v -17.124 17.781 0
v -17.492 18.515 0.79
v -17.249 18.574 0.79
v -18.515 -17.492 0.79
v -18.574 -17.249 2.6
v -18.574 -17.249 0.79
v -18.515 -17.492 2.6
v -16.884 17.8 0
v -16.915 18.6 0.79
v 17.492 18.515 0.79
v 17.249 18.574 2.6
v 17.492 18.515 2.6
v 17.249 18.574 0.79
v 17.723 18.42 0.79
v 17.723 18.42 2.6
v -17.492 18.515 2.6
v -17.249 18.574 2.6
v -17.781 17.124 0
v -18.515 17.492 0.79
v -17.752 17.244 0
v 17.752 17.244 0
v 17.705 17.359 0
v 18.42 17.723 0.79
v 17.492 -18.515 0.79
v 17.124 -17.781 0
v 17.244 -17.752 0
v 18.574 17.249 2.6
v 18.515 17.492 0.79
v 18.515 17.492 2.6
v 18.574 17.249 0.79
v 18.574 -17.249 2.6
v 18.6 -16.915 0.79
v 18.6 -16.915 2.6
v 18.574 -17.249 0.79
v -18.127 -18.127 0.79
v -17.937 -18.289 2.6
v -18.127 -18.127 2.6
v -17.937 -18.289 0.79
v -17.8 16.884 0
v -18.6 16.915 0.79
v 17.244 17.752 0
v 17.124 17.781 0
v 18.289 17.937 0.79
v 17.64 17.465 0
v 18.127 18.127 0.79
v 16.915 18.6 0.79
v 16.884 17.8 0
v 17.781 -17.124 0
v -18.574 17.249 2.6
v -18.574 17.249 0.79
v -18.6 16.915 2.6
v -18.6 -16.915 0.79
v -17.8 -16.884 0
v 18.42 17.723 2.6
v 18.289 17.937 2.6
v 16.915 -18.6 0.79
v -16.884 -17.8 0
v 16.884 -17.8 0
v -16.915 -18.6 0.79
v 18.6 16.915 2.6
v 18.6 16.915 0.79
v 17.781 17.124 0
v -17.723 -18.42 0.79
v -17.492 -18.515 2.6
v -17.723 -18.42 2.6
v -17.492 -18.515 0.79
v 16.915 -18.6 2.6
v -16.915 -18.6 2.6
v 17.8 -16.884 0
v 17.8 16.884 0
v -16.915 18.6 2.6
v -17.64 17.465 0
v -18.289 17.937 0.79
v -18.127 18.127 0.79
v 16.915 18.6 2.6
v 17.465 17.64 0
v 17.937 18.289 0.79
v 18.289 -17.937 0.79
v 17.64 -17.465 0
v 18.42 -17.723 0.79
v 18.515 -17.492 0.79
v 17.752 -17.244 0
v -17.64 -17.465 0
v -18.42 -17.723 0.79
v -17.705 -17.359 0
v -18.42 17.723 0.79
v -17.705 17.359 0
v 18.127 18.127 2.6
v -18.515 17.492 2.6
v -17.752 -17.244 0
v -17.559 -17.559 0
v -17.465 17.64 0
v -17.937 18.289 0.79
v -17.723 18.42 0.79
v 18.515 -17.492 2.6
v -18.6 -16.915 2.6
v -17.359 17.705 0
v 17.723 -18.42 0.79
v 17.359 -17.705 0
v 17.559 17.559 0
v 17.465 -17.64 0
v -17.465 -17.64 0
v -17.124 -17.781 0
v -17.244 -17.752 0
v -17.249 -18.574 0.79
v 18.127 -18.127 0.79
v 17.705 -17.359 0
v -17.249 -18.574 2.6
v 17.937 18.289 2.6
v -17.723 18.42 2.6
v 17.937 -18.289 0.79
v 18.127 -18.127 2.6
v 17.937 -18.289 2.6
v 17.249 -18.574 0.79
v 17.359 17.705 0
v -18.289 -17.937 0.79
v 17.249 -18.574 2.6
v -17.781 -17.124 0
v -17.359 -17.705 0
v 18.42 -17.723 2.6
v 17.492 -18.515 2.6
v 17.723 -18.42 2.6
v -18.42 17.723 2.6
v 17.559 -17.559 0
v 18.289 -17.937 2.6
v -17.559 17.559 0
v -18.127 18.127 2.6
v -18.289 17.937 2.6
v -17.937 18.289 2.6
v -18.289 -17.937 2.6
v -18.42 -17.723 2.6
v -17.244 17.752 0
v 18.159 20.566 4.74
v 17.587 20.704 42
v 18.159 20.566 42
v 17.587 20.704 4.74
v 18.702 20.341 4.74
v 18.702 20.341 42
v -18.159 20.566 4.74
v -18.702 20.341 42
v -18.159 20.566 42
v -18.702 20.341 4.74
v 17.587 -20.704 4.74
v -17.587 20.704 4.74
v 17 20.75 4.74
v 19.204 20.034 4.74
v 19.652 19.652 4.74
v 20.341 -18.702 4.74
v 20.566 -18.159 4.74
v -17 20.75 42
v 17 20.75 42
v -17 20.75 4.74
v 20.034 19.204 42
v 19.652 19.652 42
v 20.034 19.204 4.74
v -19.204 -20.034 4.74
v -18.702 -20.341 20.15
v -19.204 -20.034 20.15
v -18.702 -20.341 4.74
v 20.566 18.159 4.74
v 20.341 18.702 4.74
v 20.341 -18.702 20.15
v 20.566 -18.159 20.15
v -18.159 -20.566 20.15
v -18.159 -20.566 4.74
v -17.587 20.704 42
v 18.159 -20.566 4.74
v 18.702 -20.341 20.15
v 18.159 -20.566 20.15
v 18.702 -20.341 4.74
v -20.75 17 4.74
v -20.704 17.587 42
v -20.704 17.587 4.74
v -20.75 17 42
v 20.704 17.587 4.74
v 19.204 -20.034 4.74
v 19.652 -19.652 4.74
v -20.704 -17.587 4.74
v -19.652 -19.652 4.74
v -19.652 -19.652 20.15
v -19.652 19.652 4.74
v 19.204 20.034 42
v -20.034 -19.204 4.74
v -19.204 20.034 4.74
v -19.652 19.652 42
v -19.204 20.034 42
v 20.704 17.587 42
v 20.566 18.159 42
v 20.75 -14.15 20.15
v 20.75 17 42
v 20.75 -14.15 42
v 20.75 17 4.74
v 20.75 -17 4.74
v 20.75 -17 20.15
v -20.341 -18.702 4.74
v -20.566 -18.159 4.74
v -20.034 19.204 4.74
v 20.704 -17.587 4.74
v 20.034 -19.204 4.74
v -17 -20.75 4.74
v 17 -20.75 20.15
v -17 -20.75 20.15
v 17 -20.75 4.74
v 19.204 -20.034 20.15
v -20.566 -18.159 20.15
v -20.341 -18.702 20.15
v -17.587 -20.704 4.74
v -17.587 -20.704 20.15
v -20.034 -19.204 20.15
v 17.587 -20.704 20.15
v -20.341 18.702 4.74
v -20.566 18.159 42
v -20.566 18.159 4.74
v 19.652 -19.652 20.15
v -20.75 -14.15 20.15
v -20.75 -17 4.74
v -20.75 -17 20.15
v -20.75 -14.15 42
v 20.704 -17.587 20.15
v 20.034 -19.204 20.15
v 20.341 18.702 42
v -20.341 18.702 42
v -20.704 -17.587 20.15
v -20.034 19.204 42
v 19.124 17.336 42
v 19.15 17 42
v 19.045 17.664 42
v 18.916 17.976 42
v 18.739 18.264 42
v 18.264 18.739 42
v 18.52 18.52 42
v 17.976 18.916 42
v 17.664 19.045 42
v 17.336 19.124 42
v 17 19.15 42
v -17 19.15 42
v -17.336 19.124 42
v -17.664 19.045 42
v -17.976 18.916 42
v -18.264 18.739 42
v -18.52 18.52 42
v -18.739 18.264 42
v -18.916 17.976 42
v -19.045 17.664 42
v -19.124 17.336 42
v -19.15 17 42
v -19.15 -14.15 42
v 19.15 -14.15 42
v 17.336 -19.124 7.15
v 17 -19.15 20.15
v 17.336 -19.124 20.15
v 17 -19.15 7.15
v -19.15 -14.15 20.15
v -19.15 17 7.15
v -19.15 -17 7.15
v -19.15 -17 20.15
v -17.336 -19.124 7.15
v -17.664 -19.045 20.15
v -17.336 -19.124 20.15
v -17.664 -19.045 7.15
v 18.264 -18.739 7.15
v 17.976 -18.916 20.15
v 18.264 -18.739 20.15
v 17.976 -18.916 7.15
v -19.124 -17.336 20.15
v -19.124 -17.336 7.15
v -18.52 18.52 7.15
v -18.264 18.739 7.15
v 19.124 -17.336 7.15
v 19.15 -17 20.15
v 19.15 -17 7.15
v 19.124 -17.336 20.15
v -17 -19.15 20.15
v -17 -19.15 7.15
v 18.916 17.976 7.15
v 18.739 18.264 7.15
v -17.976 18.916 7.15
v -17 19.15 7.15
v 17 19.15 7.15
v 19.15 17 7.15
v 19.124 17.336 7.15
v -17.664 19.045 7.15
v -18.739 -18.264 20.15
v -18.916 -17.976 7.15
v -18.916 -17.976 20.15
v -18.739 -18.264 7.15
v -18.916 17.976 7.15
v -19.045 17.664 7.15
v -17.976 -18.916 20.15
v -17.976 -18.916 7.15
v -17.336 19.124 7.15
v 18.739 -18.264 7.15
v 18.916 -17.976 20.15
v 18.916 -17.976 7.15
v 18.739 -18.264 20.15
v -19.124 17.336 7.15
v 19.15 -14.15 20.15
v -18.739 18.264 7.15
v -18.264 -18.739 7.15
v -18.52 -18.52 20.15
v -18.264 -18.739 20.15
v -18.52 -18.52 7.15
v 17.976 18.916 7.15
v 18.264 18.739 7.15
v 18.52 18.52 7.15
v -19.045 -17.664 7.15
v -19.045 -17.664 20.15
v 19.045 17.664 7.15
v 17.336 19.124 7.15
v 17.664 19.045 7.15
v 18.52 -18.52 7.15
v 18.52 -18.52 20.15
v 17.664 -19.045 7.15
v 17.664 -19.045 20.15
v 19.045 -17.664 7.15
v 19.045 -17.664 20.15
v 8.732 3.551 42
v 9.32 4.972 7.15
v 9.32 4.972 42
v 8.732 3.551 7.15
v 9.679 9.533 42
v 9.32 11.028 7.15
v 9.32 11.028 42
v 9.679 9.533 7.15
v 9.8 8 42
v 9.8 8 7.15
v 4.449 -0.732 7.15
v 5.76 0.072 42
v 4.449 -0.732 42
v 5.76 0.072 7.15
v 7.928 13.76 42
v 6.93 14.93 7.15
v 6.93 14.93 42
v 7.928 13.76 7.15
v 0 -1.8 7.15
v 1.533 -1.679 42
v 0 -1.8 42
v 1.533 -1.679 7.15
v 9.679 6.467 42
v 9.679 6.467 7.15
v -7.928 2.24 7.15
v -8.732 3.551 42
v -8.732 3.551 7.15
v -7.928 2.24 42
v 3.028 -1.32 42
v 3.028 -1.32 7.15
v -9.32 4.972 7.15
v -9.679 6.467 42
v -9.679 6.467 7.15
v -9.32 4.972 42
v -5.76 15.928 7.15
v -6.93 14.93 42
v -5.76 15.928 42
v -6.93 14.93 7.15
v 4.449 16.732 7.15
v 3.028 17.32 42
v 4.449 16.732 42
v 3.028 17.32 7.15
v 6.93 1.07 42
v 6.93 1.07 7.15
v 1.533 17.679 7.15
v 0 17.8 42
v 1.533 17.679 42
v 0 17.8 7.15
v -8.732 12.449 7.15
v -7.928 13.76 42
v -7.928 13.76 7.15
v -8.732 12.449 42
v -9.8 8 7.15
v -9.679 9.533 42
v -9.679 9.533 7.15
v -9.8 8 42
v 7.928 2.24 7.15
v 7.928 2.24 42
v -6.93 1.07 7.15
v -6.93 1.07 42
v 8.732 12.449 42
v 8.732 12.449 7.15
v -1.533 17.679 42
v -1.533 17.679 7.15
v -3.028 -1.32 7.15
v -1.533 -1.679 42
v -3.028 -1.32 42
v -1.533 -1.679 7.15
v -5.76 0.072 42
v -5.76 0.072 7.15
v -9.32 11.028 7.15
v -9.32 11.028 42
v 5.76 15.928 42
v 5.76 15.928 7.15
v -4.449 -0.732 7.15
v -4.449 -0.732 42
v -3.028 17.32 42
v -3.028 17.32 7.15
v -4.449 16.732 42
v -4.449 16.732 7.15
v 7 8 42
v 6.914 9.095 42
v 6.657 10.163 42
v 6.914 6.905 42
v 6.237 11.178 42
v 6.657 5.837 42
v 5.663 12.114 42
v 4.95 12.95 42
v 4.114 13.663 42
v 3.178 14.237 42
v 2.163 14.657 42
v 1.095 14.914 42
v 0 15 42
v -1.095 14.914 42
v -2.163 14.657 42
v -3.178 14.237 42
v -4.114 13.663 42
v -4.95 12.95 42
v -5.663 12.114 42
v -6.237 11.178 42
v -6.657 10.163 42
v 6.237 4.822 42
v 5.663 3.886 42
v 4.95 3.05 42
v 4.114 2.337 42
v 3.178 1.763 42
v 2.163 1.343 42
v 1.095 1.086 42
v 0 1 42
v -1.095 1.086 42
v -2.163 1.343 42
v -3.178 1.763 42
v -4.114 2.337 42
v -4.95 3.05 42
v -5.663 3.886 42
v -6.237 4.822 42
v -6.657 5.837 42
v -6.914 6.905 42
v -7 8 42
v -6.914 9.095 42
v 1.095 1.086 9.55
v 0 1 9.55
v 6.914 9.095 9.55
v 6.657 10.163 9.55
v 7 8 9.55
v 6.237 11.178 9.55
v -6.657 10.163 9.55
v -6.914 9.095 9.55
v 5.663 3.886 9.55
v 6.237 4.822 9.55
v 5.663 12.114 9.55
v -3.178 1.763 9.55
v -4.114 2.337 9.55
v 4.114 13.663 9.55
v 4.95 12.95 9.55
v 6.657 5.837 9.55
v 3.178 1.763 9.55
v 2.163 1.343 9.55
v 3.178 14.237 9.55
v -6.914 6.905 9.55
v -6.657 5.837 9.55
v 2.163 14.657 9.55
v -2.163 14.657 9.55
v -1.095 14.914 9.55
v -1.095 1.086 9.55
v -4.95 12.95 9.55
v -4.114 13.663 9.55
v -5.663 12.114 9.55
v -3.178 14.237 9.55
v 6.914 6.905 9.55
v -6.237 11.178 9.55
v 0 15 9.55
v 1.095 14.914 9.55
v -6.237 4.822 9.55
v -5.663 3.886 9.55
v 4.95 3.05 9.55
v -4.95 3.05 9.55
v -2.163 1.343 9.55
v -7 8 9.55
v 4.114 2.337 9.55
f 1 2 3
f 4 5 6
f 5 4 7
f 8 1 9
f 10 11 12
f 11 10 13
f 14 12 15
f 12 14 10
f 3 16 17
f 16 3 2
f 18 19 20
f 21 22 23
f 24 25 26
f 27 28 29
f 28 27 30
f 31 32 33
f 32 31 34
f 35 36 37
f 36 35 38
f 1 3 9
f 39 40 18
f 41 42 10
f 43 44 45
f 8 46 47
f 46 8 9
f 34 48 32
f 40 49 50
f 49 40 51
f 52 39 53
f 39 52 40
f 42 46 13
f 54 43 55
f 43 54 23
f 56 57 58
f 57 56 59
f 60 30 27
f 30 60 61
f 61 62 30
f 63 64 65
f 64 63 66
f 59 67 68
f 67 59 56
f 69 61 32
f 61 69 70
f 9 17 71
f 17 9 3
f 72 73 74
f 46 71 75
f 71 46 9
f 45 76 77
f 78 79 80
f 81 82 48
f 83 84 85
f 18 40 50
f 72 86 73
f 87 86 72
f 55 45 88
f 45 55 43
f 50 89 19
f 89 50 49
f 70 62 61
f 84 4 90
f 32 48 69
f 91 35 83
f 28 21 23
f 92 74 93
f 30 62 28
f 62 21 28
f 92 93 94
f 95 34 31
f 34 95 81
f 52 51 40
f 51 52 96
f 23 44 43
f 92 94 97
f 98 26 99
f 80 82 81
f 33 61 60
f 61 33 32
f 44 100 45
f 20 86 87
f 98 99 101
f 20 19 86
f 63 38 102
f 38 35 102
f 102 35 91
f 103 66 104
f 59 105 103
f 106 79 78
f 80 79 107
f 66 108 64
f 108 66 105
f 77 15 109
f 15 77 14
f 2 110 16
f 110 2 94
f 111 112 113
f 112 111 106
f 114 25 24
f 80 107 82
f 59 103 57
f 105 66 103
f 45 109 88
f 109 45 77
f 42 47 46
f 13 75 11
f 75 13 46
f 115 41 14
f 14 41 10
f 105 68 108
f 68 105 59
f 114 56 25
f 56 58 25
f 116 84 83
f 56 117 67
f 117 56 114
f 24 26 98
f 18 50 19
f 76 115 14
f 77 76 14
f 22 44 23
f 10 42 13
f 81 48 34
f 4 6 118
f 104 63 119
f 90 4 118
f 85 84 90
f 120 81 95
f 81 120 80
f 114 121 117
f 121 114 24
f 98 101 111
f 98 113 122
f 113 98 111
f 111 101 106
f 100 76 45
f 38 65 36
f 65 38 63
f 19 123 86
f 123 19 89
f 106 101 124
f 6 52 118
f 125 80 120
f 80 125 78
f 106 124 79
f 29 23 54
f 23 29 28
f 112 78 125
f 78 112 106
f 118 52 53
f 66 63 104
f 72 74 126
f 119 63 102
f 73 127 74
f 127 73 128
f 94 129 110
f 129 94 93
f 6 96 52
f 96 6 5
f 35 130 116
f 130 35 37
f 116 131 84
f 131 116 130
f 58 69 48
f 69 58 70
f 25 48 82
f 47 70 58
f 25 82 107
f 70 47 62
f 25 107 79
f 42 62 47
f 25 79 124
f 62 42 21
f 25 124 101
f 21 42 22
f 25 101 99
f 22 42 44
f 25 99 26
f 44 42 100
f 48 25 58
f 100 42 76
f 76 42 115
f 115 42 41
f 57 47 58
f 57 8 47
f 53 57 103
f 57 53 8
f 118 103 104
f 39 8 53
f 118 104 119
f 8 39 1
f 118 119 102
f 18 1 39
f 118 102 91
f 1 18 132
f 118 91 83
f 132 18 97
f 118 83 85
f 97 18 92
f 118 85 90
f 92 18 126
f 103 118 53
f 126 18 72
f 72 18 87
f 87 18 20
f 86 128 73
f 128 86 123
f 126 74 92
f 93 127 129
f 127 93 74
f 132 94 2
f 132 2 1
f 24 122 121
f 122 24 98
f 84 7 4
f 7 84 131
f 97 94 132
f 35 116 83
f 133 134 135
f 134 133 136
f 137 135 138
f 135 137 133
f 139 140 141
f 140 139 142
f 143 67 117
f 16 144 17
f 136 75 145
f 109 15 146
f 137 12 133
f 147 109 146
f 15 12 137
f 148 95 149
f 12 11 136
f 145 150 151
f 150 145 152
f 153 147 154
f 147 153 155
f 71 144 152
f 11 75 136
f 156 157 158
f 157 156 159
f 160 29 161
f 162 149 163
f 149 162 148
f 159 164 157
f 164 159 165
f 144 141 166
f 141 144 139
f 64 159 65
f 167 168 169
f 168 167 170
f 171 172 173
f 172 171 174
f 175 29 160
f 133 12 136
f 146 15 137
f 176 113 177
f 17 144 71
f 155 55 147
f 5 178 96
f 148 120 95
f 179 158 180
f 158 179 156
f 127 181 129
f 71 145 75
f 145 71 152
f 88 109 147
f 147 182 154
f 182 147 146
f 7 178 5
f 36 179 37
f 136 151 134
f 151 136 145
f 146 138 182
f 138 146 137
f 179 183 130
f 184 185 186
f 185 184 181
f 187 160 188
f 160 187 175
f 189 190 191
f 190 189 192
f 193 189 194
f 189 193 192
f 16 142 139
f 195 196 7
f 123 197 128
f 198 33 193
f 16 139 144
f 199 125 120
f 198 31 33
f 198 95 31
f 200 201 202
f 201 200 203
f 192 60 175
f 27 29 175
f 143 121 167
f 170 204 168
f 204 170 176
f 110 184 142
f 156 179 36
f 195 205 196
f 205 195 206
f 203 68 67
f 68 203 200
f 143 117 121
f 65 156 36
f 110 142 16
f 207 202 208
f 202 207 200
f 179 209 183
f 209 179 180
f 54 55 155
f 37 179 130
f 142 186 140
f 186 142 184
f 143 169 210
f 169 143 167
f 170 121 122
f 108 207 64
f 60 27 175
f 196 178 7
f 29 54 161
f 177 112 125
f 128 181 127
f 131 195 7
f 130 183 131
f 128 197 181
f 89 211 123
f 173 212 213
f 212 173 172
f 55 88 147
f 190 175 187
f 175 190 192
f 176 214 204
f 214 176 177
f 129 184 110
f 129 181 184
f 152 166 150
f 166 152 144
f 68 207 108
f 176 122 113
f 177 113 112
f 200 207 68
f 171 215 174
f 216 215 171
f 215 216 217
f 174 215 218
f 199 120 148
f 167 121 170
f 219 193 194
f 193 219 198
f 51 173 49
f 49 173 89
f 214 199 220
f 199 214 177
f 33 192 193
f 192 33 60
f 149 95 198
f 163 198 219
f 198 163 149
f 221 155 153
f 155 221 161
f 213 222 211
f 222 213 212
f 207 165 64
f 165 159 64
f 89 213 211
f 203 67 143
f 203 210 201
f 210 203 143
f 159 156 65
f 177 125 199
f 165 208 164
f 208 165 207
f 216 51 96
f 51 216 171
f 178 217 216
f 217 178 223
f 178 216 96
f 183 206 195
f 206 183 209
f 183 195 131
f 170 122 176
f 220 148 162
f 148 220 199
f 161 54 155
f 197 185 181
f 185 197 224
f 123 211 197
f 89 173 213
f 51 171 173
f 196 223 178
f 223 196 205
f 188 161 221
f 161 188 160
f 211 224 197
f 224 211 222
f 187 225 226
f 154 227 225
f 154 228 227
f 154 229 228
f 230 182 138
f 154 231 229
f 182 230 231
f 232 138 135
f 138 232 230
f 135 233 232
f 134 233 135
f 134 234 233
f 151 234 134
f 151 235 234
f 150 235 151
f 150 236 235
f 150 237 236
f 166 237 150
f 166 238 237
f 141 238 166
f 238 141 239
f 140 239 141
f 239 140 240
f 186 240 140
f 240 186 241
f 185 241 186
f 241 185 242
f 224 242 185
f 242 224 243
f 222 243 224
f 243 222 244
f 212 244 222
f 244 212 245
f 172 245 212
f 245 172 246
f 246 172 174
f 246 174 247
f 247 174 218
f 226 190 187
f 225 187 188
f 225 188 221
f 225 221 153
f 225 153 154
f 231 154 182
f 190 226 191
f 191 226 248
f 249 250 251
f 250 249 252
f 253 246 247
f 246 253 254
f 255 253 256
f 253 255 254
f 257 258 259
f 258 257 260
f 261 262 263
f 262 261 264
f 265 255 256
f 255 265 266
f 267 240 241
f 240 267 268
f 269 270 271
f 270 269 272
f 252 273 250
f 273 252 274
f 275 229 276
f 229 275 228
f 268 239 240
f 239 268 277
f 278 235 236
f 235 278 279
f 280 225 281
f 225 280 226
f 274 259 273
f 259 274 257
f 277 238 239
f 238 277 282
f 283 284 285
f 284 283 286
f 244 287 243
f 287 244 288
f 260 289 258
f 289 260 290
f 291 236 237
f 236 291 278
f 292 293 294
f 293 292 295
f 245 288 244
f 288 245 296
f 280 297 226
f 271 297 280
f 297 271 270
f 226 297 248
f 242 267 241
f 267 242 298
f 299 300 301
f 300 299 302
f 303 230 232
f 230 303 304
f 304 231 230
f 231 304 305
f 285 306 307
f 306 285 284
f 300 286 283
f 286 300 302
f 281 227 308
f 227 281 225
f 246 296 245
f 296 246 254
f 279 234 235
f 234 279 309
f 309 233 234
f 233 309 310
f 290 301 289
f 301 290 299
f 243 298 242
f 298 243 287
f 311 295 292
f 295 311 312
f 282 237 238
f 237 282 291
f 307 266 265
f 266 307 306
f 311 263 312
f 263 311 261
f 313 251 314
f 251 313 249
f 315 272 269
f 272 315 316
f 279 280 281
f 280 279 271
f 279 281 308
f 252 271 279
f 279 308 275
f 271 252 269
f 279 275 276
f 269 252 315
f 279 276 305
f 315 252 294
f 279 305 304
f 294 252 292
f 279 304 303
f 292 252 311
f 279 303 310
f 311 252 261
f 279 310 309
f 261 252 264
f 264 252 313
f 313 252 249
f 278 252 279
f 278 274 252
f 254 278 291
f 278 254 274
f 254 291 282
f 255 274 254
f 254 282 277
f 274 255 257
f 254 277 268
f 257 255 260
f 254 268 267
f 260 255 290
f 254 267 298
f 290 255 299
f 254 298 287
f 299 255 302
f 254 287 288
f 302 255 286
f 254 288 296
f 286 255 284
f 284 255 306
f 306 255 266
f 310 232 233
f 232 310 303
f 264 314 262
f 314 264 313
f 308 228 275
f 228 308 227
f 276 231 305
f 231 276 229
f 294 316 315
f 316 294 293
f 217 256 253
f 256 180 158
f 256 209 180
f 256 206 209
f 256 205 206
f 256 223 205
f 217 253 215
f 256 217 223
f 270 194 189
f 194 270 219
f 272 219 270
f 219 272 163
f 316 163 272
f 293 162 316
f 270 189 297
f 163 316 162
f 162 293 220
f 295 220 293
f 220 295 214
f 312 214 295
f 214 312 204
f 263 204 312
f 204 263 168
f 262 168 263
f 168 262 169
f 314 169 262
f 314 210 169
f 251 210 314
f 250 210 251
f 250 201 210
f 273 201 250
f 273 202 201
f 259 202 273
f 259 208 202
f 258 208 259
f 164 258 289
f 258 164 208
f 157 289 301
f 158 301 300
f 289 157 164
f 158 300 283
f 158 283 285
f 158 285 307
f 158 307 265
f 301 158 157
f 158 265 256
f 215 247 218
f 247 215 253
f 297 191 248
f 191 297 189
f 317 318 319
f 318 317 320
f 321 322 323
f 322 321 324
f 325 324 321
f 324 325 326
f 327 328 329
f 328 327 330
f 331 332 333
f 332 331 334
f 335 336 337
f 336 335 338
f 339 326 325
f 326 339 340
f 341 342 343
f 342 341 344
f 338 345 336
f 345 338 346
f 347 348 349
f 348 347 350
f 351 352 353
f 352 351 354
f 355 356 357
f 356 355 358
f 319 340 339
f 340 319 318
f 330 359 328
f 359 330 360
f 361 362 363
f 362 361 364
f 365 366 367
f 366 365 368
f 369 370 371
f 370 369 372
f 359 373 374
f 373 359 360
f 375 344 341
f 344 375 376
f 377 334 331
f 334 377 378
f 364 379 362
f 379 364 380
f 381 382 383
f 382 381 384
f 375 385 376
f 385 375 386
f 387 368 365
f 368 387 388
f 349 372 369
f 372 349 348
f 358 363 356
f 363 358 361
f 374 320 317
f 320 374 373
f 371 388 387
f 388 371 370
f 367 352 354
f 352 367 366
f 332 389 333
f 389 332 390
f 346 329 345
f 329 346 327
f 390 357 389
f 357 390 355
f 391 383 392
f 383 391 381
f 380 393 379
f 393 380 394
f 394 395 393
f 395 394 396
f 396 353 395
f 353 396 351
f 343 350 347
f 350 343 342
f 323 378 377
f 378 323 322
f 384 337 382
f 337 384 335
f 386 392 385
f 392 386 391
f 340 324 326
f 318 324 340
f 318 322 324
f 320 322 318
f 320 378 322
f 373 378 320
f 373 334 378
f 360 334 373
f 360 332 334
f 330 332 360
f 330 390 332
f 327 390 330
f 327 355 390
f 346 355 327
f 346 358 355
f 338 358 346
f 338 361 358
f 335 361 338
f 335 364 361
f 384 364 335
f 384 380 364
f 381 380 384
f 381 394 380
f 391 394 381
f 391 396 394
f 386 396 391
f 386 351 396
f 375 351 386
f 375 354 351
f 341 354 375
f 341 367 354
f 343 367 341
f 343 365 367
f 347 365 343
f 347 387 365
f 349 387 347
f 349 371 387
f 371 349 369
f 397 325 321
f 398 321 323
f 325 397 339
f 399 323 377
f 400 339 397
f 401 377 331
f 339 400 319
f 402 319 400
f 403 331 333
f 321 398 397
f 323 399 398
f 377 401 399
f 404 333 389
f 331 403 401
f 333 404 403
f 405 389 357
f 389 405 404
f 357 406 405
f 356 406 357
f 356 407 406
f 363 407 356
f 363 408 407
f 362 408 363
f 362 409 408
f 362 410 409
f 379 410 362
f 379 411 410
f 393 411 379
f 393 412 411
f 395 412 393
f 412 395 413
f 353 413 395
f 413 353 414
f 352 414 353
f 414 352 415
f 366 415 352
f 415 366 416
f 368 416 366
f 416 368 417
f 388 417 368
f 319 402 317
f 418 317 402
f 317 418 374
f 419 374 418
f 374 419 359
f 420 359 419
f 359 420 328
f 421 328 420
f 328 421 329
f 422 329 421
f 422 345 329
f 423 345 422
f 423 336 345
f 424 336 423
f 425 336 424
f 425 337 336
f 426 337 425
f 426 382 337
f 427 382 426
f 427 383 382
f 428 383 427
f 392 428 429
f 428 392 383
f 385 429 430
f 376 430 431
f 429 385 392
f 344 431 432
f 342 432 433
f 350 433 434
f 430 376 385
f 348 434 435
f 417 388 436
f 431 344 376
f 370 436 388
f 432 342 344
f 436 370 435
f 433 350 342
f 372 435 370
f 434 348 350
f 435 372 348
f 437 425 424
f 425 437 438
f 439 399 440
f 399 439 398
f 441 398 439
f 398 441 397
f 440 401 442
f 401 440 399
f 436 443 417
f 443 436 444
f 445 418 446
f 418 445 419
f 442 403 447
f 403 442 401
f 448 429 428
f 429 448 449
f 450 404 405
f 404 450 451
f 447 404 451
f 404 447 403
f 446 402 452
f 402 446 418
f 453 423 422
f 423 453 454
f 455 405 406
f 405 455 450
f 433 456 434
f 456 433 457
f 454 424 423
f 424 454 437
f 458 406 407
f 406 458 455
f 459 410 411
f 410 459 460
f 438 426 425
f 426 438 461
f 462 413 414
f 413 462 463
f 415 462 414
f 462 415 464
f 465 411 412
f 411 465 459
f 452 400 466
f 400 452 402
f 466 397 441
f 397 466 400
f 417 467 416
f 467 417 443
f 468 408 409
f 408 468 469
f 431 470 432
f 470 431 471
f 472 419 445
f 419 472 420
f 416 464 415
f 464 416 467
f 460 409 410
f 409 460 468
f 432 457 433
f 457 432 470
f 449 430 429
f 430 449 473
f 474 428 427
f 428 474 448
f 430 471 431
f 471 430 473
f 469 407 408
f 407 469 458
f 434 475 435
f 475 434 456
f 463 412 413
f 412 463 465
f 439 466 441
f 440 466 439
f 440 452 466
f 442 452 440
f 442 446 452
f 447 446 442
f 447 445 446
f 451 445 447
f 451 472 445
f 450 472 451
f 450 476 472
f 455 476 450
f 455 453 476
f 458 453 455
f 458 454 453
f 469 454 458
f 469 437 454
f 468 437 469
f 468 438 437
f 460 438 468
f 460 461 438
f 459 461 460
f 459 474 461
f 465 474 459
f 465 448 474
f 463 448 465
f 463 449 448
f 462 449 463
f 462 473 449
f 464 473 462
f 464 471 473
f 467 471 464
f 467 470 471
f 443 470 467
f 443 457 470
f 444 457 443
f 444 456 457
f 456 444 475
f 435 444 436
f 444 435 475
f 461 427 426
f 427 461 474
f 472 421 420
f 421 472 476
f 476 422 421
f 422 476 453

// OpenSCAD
// file: ../lib/gridfinity.scad
// SPDX-License-Identifier: MIT
// Copyright (c) 2026 Aaron Cupp
//
// gridfinity.scad — shared Gridfinity baseplate + bin library (per spec).
//
// 42 mm pitch, 41.5 mm bins, baseplate socket 0.7/1.8/2.15 = 4.65 mm, 4 mm
// fillet; bin foot 0.8/1.8/2.15 = 4.75 mm, 3.75 mm corner radius. Verified the
// bin foot seats in the baseplate socket with ~0.25–0.5 mm clearance.
//
//   baseplate(nx, ny)                      — tiled receiving baseplate
//   bin_blank(nx, ny, h)                   — solid bin body (feet + block, no cavity)
//   bin(nx, ny, h, wall, floor)            — open Gridfinity bin
//   divided_bin(nx, ny, h, cols, rows, …)  — bin with internal compartments
//   lid(nx, ny, …)                         — friction lid for a bin of the same footprint
//   stack_base(nx, ny, h, …)               — baseplate-topped base; a bin socket-stacks on it

GF = 42; GF_FILLET = 4;
_C_TOP = 2.15; _C_MID = 1.8; _C_BOT = 0.7;
_BP_LIP = _C_TOP + _C_MID + _C_BOT; _BP_FLOOR = 1.2; BP_H = _BP_LIP + _BP_FLOOR;  // 5.85
BIN_SZ = 41.5; BIN_R = 3.75; BIN_BASE_H = 4.75;

// ---- baseplate ----
module _bp_cell(i = 0) { offset(r = -i) offset(r = GF_FILLET) offset(r = -GF_FILLET) square(GF, center = true); }
module _bp_socket() {
    e = 0.01;
    hull() { translate([0,0,BP_H-e]) linear_extrude(e) _bp_cell(0); translate([0,0,BP_H-_C_TOP]) linear_extrude(e) _bp_cell(_C_TOP); }
    translate([0,0,BP_H-_C_TOP-_C_MID]) linear_extrude(_C_MID) _bp_cell(_C_TOP);
    hull() { translate([0,0,BP_H-_C_TOP-_C_MID-e]) linear_extrude(e) _bp_cell(_C_TOP); translate([0,0,BP_H-_BP_LIP]) linear_extrude(e) _bp_cell(_C_TOP+_C_BOT); }
}
module baseplate(nx, ny) {
    w = nx*GF; d = ny*GF;
    difference() {
        translate([0,0,BP_H/2]) linear_extrude(BP_H, center=true) offset(GF_FILLET) offset(-GF_FILLET) square([w,d], center=true);
        for (ix=[0:nx-1], iy=[0:ny-1]) translate([(ix-(nx-1)/2)*GF, (iy-(ny-1)/2)*GF, 0]) _bp_socket();
    }
}

// ---- bin ----
module _bin_cell(i = 0) { offset(r = -i) offset(r = BIN_R) offset(r = -BIN_R) square(BIN_SZ, center = true); }
module _bin_foot() {
    e = 0.01;
    hull() { linear_extrude(e) _bin_cell(2.95); translate([0,0,0.8]) linear_extrude(e) _bin_cell(2.15); }    // bottom chamfer
    translate([0,0,0.8]) linear_extrude(1.8) _bin_cell(2.15);                                                 // vertical
    hull() { translate([0,0,2.6]) linear_extrude(e) _bin_cell(2.15); translate([0,0,BIN_BASE_H]) linear_extrude(e) _bin_cell(0); } // top chamfer
}
// Solid bin body: Gridfinity feet + the block above them, with no cavity cut.
// Cup-style bins (lib/vessel.scad) subtract their own bores from this instead of
// re-deriving the foot + shell union.
module bin_blank(nx, ny, h) {
    W = nx*GF - 0.5; D = ny*GF - 0.5;
    union() {
        for (ix=[0:nx-1], iy=[0:ny-1]) translate([(ix-(nx-1)/2)*GF, (iy-(ny-1)/2)*GF, 0]) _bin_foot();
        translate([0,0,BIN_BASE_H]) linear_extrude(h-BIN_BASE_H) offset(BIN_R) offset(-BIN_R) square([W,D], center=true);
    }
}

module _bin_shell(nx, ny, h, wall, floor) {
    W = nx*GF - 0.5; D = ny*GF - 0.5;
    difference() {
        bin_blank(nx, ny, h);
        translate([0,0,BIN_BASE_H+floor]) linear_extrude(h) offset(BIN_R-wall) offset(-(BIN_R-wall)) square([W-2*wall, D-2*wall], center=true);
    }
}
module bin(nx, ny, h, wall = 1.2, floor = 1.4) { _bin_shell(nx, ny, h, wall, floor); }

// ---- stacking base ----
// A bin whose TOP is a Gridfinity baseplate, so a standard bin socket-stacks on
// it (two-tier towers: instrument on top, cords/jig/adapters in the base). The
// base is open at the FRONT (−Y) by default so the lower item is reachable while
// the top tier stays socketed — same idea as drybox-splitter-stand's open cubby.
// The whole tower foots on the bench baseplate via this base's own foot.
//
//   h = interior height of the lower compartment (floor to the baseplate cap).
module stack_base(nx, ny, h, wall = 1.2, floor = 1.4, open_front = true) {
    W = nx*GF - 0.5; D = ny*GF - 0.5;
    z0 = BIN_BASE_H + floor;
    iw = W - 2*wall; id = D - 2*wall;
    difference() {
        union() {
            bin_blank(nx, ny, h);                    // solid foot + block to h
            translate([0,0,h]) baseplate(nx, ny);    // baseplate cap (sockets up)
        }
        // lower cavity, floor up to the cap underside
        translate([0,0,z0]) linear_extrude(h - z0 + 0.01)
            offset(BIN_R-wall) offset(-(BIN_R-wall)) square([iw, id], center=true);
        // open front: cut the −Y wall so you reach in under the cap
        if (open_front)
            translate([-iw/2, -D, z0]) cube([iw, D/2 + 0.01, h - z0 + 0.01]);
    }
}

module divided_bin(nx, ny, h, cols = 1, rows = 1, wall = 1.2, floor = 1.4, div = 1.2) {
    W = nx*GF - 0.5; D = ny*GF - 0.5;
    union() {
        bin(nx, ny, h, wall, floor);
        // internal divider walls (from the floor up to the rim)
        iw = W - 2*wall; id = D - 2*wall; z0 = BIN_BASE_H + floor;
        for (c = [1 : cols-1]) translate([-iw/2 + c*iw/cols - div/2, -id/2, z0]) cube([div, id, h - z0]);
        for (r = [1 : rows-1]) translate([-iw/2, -id/2 + r*id/rows - div/2, z0]) cube([iw, div, h - z0]);
    }
}

// ---- lid ----
// Friction lid for a bin of the same footprint: a flat plate with a skirt that
// drops into the bin's cavity. Emitted PRINT-READY — plate on the bed, skirt
// standing up — so it needs no supports. Flip it in your head to picture it
// fitted: the plate then caps the rim and the lid adds `t` to the stack height.
//
// Why lids exist here: full-extension drawer slides let small parts hop between
// compartments on a hard close, and brass inserts aren't magnetic — you can't
// sweep them back. `wall` must match the bin's wall so the skirt lands in the
// cavity; `clearance` is per-side slop between skirt and cavity.
module lid(nx, ny, t = 1.6, skirt = 4, wall = 1.2, clearance = 0.35, lid_wall = 1.6) {
    W = nx*GF - 0.5; D = ny*GF - 0.5;
    iw = W - 2*wall - 2*clearance; id = D - 2*wall - 2*clearance;   // skirt outer
    ir = BIN_R - wall;                                              // cavity corner radius
    union() {
        linear_extrude(t) offset(BIN_R) offset(-BIN_R) square([W, D], center=true);
        translate([0,0,t]) linear_extrude(skirt) difference() {
            offset(ir) offset(-ir) square([iw, id], center=true);
            offset(ir-lid_wall) offset(-(ir-lid_wall)) square([iw-2*lid_wall, id-2*lid_wall], center=true);
        }
    }
}
// main file
// bin_probe_leads — one bucket for the probe and the alligator lead.
//
// Sits BEHIND the Shortkiller in ONE of the two rear cells. The other rear cell
// stays empty — the Shortkiller's DC cord is not detachable and needs that route. The probe stands
// TIP-DOWN in a blind tube rising from the bin floor; the alligator lead drapes
// into the open well around that tube. Both stay plugged into the Shortkiller's
// GX12 connector — you drop them in, you don't unplug and coil them.
//
// Tip-down is deliberate: the sharp end is buried in plastic and you grab the
// handle. Same reasoning as the UV lamp holster in phase-2 (B.5).
//
// The wall facing the Shortkiller is cut down to LEADS_FACE_H so this bin does
// not shadow the box's rear DC jack and rocker switch.
//
// PRINT: flat, foot down, no supports. The tube is self-supporting.
include <../lib/gridfinity.scad>
include <shortkiller_common.scad>

LW      = NX_LEADS * GF - 0.5;
LD      = NY_LEADS * GF - 0.5;
LFLOOR  = BIN_BASE_H + FLOOR_T;          // no flare on this bin — stock floor
TUBE_ID = PROBE_D + PROBE_CLR;
TUBE_OD = TUBE_ID + 2 * PROBE_WALL;

module bin_probe_leads() {
    union() {
        difference() {
            bin_blank(NX_LEADS, NY_LEADS, LEADS_BIN_H);

            // open well
            translate([0, 0, LFLOOR])
                linear_extrude(LEADS_BIN_H)
                    offset(BIN_R - LEADS_WALL) offset(-(BIN_R - LEADS_WALL))
                        square([LW - 2 * LEADS_WALL, LD - 2 * LEADS_WALL],
                               center = true);

            // cut the wall facing the Shortkiller (-Y) down to LEADS_FACE_H
            // NB: overshoot past the well's inner face. Ending flush with it
            // leaves a coincident face and the mesh goes non-manifold.
            translate([-LW / 2 - 1, -LD / 2 - 1, LFLOOR + LEADS_FACE_H])
                cube([LW + 2, LEADS_WALL + 6, LEADS_BIN_H]);
        }

        // probe tube, floor to rim
        translate([0, PROBE_OFFSET, LFLOOR])
            difference() {
                cylinder(d = TUBE_OD, h = LEADS_BIN_H - LFLOOR);
                translate([0, 0, FLOOR_T])
                    cylinder(d = TUBE_ID, h = LEADS_BIN_H);   // blind — tip sits on FLOOR_T
            }
    }
}

bin_probe_leads();
